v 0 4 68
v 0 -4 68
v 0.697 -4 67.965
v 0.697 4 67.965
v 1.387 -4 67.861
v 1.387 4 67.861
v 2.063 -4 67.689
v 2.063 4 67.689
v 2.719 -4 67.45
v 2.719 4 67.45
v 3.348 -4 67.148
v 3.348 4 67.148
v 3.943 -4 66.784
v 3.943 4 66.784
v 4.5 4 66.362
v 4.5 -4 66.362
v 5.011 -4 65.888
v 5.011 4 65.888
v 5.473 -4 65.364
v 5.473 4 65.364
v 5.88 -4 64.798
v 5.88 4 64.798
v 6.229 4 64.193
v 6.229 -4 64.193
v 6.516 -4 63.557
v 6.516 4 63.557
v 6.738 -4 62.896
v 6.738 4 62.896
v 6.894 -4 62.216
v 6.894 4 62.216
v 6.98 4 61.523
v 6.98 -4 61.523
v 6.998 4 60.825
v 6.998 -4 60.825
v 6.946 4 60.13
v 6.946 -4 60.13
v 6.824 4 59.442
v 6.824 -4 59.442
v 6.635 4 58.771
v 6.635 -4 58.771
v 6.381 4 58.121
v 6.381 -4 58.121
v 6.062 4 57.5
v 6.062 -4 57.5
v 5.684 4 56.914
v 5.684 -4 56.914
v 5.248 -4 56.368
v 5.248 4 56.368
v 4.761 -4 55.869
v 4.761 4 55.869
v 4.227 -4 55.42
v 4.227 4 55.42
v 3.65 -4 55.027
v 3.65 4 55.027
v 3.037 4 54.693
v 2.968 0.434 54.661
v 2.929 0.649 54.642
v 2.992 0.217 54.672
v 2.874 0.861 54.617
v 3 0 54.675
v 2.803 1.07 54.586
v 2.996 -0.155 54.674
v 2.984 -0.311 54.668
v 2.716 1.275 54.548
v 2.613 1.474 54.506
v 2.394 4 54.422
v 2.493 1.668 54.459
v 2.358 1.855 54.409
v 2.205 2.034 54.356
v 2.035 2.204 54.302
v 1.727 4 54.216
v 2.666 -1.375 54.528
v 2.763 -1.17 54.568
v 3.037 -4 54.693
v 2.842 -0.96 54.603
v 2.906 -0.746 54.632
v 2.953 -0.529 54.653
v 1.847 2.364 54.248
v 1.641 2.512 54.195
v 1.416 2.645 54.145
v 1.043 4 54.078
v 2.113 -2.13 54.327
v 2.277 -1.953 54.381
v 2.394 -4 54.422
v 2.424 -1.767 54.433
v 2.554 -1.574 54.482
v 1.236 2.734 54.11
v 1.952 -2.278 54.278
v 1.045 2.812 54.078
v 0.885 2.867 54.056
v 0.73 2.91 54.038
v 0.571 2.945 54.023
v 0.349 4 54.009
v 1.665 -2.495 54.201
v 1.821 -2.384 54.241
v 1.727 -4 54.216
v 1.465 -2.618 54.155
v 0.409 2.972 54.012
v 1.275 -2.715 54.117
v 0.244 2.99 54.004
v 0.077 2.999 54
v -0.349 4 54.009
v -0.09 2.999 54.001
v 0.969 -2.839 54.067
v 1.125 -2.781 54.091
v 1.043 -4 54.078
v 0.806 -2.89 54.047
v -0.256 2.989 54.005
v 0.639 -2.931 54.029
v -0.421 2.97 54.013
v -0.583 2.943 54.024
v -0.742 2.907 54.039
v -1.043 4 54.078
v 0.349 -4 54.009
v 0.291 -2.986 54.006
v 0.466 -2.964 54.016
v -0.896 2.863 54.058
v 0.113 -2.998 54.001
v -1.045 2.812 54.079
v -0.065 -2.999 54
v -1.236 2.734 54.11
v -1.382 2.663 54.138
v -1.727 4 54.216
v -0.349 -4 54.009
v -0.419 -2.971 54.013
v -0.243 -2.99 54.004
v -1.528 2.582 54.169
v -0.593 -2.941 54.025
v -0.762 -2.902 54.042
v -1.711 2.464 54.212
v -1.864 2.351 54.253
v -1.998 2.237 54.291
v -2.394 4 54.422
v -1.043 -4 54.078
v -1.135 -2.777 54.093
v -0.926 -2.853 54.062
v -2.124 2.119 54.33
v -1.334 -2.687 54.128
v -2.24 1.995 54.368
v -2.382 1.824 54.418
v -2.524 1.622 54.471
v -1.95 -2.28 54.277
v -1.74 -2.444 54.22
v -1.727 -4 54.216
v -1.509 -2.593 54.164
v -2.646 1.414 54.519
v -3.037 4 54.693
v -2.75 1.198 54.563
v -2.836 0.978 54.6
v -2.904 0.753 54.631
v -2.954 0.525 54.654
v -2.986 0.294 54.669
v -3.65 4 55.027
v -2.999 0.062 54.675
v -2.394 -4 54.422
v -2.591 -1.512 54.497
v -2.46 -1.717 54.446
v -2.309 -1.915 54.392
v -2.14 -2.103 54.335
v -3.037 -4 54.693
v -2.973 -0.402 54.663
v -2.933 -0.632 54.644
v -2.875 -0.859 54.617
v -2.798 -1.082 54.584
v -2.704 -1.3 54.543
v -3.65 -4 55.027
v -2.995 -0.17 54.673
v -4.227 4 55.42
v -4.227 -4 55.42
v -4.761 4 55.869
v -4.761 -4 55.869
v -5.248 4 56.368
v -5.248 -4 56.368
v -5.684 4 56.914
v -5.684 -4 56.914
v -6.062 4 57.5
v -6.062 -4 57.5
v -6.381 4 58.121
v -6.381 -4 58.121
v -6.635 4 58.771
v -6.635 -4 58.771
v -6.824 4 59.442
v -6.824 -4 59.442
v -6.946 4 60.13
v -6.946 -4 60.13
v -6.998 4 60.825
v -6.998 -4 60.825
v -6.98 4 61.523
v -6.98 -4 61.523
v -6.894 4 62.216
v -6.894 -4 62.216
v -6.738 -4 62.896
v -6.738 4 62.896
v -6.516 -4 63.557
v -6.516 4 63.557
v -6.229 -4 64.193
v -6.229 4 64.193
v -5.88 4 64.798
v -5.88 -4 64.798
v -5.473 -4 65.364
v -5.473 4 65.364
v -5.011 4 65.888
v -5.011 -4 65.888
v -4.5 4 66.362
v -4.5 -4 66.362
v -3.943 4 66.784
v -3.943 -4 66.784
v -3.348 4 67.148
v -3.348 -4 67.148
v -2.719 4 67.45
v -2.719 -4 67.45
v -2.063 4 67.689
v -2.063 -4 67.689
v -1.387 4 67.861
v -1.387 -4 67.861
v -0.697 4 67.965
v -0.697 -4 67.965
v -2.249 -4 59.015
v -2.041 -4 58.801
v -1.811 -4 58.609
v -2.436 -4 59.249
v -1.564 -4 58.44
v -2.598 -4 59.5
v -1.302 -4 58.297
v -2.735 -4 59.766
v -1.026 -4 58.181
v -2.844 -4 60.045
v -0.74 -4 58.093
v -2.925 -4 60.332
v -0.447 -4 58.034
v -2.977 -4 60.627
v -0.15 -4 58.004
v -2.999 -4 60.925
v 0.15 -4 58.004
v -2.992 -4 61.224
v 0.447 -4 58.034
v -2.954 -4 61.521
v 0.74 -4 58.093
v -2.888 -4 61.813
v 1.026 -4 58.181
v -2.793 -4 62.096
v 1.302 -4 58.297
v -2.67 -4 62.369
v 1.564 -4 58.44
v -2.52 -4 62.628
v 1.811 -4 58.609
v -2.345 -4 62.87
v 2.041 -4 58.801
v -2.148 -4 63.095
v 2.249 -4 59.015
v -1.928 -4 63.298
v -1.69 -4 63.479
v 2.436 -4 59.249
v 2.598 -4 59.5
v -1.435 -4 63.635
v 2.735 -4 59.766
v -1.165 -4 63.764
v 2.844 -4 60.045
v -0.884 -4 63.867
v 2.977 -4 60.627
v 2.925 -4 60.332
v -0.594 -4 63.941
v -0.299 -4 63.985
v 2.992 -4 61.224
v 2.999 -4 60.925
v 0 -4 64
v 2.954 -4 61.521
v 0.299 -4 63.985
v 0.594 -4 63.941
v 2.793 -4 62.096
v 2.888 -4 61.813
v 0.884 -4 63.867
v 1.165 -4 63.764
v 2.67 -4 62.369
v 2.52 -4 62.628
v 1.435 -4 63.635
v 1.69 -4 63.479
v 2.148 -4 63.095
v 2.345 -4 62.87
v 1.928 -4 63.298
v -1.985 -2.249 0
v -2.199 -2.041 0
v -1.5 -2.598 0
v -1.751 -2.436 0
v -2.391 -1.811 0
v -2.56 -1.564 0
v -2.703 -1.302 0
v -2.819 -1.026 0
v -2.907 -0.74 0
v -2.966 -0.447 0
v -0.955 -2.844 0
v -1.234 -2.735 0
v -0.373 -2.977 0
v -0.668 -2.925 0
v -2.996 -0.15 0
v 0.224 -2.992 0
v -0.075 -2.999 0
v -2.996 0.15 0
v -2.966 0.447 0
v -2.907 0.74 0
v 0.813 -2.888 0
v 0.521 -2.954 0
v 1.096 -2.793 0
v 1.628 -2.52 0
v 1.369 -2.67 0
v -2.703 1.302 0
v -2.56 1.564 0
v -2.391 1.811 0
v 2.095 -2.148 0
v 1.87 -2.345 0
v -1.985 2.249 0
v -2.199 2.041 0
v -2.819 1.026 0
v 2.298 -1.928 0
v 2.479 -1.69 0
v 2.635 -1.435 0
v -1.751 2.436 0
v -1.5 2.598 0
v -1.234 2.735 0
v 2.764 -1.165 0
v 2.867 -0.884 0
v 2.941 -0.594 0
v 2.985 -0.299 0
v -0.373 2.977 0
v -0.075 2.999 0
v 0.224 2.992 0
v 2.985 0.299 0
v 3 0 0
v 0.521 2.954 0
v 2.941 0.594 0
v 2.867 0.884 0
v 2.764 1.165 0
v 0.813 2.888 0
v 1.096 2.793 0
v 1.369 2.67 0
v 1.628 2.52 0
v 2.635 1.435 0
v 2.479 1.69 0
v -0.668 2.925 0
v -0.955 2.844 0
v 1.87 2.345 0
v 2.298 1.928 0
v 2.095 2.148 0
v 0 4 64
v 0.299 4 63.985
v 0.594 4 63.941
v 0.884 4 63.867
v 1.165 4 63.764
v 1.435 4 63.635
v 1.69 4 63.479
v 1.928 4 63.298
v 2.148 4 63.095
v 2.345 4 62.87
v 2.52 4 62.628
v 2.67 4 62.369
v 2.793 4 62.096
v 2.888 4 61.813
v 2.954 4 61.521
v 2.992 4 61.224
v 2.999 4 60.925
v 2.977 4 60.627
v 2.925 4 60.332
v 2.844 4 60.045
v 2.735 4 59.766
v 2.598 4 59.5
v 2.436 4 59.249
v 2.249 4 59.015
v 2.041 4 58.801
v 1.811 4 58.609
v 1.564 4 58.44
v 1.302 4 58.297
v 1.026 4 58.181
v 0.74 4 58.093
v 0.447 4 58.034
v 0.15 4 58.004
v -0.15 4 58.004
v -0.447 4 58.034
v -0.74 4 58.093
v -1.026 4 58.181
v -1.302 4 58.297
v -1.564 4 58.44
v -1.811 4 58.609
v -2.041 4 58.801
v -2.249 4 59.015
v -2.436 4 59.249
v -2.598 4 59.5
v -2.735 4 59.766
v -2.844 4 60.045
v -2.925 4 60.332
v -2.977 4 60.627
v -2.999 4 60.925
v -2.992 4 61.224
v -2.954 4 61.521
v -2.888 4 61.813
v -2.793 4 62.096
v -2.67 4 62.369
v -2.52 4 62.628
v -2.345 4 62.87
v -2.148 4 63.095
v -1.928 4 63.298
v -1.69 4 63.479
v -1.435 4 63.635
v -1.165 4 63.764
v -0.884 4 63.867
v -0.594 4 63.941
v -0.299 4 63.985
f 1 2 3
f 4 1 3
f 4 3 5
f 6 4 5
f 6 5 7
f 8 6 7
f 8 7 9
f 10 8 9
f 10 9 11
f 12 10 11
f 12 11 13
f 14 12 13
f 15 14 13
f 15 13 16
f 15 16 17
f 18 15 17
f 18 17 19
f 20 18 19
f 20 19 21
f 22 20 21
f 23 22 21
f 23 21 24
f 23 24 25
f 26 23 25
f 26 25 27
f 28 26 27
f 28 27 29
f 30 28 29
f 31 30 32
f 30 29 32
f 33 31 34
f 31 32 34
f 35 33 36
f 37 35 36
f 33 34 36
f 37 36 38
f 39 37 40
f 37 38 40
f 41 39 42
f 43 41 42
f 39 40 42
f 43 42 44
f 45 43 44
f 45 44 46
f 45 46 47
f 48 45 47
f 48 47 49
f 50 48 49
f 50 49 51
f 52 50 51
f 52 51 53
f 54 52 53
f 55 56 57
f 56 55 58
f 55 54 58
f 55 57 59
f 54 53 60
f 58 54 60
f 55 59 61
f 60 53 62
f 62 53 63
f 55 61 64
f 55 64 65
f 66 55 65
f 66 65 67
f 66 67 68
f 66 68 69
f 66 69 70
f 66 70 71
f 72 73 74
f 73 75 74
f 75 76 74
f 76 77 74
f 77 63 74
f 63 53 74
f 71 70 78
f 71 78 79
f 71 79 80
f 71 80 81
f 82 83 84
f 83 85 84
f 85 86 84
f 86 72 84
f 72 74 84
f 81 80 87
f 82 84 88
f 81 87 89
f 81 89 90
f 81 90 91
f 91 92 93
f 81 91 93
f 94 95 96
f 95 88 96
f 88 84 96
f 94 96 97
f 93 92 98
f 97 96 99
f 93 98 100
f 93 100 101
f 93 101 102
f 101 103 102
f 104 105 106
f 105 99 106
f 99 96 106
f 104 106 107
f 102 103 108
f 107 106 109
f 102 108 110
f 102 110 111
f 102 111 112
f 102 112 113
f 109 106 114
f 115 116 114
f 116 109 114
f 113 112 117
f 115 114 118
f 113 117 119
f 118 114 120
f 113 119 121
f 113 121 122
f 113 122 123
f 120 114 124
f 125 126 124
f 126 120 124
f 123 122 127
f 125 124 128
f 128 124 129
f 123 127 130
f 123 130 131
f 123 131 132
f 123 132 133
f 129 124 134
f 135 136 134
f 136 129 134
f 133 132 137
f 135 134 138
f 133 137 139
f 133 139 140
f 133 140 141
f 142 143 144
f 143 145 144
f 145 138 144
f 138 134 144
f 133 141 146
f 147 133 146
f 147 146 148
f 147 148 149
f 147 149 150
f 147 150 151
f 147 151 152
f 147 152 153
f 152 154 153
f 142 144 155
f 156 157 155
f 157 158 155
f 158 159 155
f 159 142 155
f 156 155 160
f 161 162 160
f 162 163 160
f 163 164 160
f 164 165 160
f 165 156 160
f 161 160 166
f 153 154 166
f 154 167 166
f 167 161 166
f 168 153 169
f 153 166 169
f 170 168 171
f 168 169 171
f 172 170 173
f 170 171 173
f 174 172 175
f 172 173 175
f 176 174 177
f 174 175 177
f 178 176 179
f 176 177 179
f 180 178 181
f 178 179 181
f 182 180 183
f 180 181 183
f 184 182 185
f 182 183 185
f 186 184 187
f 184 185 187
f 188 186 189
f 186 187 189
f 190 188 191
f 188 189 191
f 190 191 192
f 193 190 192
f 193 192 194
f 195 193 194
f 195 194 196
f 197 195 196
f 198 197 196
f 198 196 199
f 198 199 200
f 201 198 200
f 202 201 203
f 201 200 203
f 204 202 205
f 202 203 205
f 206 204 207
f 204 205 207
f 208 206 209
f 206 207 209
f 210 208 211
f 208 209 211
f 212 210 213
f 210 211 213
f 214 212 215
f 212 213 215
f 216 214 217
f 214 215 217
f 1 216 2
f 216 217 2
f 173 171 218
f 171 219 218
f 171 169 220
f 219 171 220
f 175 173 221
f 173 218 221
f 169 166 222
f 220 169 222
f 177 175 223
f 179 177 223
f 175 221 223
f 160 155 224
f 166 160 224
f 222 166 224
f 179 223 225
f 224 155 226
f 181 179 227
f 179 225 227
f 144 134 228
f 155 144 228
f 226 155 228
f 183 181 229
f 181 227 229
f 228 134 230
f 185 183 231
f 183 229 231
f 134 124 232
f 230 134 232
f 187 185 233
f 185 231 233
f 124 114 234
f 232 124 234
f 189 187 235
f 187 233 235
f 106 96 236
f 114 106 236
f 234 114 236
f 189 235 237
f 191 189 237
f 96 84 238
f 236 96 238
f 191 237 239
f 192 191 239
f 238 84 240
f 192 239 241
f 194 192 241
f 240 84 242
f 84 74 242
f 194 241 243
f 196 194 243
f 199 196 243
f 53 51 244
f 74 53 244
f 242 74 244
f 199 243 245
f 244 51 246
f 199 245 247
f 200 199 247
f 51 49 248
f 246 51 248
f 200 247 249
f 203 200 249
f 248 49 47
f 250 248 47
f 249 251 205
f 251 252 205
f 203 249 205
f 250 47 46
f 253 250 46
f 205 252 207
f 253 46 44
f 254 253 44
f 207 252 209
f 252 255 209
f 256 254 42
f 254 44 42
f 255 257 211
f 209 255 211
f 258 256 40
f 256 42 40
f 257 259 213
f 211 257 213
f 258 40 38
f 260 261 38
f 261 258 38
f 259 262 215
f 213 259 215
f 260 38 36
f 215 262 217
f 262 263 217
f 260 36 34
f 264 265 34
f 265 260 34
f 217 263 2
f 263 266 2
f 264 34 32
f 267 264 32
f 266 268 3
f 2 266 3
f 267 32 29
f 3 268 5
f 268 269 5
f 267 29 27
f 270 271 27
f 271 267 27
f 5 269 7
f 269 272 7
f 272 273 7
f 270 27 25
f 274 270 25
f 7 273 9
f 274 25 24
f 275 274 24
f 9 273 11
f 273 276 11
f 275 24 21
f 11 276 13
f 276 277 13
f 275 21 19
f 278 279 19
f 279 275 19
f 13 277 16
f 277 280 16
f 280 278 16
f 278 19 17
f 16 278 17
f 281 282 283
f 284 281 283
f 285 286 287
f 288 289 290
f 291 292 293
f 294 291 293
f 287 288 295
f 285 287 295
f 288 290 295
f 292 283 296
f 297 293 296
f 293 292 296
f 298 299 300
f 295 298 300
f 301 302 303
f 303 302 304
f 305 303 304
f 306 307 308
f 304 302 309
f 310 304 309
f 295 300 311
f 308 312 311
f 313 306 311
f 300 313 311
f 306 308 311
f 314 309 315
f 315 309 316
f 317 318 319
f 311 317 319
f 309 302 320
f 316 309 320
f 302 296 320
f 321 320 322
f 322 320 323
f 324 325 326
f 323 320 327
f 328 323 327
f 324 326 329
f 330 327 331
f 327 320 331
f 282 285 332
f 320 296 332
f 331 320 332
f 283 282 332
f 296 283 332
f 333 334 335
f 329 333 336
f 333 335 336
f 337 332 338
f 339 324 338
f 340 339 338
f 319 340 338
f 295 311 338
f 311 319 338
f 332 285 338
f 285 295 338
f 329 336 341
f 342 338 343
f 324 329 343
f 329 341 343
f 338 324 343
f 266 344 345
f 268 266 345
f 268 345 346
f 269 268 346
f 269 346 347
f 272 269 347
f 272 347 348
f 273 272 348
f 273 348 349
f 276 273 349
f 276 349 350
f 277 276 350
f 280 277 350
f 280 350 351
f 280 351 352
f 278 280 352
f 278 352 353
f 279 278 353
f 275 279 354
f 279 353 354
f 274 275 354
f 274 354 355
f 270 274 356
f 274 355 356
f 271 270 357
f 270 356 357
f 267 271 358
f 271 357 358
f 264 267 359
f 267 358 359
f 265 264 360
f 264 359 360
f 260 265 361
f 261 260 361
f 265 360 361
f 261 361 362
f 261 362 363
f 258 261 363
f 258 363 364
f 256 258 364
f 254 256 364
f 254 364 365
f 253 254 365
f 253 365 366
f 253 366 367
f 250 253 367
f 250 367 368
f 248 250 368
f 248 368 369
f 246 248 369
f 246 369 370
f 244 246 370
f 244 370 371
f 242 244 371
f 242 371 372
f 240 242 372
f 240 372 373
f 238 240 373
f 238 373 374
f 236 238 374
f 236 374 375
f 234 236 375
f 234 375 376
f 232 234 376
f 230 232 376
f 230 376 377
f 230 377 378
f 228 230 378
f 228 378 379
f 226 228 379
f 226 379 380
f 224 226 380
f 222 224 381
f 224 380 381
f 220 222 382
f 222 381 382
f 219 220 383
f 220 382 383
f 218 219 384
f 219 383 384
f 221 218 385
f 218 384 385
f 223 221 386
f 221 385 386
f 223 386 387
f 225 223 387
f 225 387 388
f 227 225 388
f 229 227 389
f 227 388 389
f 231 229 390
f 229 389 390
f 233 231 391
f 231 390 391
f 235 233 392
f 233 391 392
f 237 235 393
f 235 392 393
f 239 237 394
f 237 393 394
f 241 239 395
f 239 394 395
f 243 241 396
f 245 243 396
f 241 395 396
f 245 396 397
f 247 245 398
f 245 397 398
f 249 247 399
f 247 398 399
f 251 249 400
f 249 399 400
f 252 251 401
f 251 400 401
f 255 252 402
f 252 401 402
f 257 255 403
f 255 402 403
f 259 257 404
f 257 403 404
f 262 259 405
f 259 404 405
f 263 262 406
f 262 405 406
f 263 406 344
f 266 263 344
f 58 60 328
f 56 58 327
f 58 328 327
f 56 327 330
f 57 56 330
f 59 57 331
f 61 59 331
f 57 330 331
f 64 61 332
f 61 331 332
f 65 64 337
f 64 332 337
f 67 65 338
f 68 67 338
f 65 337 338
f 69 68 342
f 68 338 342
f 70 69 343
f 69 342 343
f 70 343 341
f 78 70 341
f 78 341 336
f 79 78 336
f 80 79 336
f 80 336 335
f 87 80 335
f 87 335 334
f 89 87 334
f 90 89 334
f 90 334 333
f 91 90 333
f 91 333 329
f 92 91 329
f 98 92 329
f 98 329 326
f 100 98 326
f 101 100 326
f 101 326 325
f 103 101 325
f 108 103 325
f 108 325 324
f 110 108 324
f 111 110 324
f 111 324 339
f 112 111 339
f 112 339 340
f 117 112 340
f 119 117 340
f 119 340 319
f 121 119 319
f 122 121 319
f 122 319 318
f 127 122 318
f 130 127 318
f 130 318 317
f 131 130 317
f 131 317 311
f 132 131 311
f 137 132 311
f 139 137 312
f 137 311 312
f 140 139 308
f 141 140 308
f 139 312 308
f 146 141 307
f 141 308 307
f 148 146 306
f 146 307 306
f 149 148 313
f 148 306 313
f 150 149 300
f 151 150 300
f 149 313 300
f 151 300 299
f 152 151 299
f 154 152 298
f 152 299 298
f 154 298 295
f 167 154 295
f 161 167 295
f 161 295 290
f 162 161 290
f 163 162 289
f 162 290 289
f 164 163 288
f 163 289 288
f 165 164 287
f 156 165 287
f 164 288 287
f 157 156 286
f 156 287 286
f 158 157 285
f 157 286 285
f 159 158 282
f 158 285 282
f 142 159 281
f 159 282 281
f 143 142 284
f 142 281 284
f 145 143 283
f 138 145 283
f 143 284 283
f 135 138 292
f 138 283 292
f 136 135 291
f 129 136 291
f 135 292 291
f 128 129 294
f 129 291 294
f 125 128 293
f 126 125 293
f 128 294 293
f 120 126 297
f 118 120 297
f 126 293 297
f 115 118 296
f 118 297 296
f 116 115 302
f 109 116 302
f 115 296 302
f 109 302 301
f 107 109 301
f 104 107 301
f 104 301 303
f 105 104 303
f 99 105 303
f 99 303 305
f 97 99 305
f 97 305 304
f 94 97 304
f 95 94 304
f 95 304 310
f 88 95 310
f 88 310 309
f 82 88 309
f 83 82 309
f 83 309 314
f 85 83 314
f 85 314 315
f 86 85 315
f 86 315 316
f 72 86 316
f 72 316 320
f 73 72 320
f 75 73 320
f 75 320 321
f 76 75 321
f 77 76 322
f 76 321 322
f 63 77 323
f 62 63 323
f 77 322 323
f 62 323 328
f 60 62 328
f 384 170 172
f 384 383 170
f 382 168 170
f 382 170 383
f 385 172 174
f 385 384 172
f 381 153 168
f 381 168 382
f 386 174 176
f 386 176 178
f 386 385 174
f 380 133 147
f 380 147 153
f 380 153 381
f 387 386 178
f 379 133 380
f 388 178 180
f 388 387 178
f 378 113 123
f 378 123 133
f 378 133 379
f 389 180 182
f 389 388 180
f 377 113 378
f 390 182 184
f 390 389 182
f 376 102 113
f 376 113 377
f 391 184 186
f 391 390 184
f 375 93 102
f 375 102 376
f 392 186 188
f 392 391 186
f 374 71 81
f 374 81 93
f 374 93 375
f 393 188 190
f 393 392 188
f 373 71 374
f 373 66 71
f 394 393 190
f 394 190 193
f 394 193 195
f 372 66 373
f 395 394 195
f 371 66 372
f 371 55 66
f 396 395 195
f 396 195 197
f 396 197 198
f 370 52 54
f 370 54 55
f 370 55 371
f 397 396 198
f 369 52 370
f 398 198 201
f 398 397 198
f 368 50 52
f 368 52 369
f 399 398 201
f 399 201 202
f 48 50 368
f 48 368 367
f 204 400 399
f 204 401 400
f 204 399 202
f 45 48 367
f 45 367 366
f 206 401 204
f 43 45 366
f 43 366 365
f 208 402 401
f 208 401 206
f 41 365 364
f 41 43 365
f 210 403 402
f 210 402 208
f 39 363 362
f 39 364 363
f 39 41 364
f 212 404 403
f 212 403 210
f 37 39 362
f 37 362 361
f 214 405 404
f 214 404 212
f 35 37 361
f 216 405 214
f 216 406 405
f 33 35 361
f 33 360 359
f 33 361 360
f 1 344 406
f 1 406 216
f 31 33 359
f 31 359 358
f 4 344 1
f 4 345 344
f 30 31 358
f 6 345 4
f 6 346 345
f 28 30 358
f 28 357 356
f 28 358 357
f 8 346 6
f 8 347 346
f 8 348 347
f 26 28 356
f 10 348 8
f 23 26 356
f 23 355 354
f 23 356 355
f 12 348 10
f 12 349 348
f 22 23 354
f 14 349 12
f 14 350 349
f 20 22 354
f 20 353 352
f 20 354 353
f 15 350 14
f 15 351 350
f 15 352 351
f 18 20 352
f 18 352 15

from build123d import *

# Parameters (mm, degrees)
SKETCH_1_R           = 3
EXTRUDE_1_DEPTH      = 55
EXTRUDE_2_DEPTH      = 4
EXTRUDE_2_DEPTH_BACK = 4
SKETCH_3_R           = 7
SKETCH_4_R           = 3
CUT_EXTRUDE_1_DEPTH  = 69.825867351


with BuildPart() as part:
    # Эскиз1 → Бобышка-Вытянуть1 (new body)
    with BuildSketch(Plane.XY):
        Circle(SKETCH_1_R)
    extrude(amount=EXTRUDE_1_DEPTH)

    # Эскиз3 → Бобышка-Вытянуть2 (add, two sides: drawn at the far end of the back side and taken through both)
    with BuildSketch(Plane(origin=(0, 0, 0), x_dir=(1, 0, 0), z_dir=(0, 1, 0)).offset(-EXTRUDE_2_DEPTH_BACK)):
        with Locations((0, -61)):
            Circle(SKETCH_3_R)
    extrude(amount=EXTRUDE_2_DEPTH + EXTRUDE_2_DEPTH_BACK)

    # Эскиз4 → Вырез-Вытянуть1 (cut, through all)
    with BuildSketch(Plane(origin=(0, 4, 0), x_dir=(1, 0, 0), z_dir=(0, 1, 0))):
        with Locations((0, -61)):
            Circle(SKETCH_4_R)
    extrude(amount=-CUT_EXTRUDE_1_DEPTH, mode=Mode.SUBTRACT)


solid = part.part
